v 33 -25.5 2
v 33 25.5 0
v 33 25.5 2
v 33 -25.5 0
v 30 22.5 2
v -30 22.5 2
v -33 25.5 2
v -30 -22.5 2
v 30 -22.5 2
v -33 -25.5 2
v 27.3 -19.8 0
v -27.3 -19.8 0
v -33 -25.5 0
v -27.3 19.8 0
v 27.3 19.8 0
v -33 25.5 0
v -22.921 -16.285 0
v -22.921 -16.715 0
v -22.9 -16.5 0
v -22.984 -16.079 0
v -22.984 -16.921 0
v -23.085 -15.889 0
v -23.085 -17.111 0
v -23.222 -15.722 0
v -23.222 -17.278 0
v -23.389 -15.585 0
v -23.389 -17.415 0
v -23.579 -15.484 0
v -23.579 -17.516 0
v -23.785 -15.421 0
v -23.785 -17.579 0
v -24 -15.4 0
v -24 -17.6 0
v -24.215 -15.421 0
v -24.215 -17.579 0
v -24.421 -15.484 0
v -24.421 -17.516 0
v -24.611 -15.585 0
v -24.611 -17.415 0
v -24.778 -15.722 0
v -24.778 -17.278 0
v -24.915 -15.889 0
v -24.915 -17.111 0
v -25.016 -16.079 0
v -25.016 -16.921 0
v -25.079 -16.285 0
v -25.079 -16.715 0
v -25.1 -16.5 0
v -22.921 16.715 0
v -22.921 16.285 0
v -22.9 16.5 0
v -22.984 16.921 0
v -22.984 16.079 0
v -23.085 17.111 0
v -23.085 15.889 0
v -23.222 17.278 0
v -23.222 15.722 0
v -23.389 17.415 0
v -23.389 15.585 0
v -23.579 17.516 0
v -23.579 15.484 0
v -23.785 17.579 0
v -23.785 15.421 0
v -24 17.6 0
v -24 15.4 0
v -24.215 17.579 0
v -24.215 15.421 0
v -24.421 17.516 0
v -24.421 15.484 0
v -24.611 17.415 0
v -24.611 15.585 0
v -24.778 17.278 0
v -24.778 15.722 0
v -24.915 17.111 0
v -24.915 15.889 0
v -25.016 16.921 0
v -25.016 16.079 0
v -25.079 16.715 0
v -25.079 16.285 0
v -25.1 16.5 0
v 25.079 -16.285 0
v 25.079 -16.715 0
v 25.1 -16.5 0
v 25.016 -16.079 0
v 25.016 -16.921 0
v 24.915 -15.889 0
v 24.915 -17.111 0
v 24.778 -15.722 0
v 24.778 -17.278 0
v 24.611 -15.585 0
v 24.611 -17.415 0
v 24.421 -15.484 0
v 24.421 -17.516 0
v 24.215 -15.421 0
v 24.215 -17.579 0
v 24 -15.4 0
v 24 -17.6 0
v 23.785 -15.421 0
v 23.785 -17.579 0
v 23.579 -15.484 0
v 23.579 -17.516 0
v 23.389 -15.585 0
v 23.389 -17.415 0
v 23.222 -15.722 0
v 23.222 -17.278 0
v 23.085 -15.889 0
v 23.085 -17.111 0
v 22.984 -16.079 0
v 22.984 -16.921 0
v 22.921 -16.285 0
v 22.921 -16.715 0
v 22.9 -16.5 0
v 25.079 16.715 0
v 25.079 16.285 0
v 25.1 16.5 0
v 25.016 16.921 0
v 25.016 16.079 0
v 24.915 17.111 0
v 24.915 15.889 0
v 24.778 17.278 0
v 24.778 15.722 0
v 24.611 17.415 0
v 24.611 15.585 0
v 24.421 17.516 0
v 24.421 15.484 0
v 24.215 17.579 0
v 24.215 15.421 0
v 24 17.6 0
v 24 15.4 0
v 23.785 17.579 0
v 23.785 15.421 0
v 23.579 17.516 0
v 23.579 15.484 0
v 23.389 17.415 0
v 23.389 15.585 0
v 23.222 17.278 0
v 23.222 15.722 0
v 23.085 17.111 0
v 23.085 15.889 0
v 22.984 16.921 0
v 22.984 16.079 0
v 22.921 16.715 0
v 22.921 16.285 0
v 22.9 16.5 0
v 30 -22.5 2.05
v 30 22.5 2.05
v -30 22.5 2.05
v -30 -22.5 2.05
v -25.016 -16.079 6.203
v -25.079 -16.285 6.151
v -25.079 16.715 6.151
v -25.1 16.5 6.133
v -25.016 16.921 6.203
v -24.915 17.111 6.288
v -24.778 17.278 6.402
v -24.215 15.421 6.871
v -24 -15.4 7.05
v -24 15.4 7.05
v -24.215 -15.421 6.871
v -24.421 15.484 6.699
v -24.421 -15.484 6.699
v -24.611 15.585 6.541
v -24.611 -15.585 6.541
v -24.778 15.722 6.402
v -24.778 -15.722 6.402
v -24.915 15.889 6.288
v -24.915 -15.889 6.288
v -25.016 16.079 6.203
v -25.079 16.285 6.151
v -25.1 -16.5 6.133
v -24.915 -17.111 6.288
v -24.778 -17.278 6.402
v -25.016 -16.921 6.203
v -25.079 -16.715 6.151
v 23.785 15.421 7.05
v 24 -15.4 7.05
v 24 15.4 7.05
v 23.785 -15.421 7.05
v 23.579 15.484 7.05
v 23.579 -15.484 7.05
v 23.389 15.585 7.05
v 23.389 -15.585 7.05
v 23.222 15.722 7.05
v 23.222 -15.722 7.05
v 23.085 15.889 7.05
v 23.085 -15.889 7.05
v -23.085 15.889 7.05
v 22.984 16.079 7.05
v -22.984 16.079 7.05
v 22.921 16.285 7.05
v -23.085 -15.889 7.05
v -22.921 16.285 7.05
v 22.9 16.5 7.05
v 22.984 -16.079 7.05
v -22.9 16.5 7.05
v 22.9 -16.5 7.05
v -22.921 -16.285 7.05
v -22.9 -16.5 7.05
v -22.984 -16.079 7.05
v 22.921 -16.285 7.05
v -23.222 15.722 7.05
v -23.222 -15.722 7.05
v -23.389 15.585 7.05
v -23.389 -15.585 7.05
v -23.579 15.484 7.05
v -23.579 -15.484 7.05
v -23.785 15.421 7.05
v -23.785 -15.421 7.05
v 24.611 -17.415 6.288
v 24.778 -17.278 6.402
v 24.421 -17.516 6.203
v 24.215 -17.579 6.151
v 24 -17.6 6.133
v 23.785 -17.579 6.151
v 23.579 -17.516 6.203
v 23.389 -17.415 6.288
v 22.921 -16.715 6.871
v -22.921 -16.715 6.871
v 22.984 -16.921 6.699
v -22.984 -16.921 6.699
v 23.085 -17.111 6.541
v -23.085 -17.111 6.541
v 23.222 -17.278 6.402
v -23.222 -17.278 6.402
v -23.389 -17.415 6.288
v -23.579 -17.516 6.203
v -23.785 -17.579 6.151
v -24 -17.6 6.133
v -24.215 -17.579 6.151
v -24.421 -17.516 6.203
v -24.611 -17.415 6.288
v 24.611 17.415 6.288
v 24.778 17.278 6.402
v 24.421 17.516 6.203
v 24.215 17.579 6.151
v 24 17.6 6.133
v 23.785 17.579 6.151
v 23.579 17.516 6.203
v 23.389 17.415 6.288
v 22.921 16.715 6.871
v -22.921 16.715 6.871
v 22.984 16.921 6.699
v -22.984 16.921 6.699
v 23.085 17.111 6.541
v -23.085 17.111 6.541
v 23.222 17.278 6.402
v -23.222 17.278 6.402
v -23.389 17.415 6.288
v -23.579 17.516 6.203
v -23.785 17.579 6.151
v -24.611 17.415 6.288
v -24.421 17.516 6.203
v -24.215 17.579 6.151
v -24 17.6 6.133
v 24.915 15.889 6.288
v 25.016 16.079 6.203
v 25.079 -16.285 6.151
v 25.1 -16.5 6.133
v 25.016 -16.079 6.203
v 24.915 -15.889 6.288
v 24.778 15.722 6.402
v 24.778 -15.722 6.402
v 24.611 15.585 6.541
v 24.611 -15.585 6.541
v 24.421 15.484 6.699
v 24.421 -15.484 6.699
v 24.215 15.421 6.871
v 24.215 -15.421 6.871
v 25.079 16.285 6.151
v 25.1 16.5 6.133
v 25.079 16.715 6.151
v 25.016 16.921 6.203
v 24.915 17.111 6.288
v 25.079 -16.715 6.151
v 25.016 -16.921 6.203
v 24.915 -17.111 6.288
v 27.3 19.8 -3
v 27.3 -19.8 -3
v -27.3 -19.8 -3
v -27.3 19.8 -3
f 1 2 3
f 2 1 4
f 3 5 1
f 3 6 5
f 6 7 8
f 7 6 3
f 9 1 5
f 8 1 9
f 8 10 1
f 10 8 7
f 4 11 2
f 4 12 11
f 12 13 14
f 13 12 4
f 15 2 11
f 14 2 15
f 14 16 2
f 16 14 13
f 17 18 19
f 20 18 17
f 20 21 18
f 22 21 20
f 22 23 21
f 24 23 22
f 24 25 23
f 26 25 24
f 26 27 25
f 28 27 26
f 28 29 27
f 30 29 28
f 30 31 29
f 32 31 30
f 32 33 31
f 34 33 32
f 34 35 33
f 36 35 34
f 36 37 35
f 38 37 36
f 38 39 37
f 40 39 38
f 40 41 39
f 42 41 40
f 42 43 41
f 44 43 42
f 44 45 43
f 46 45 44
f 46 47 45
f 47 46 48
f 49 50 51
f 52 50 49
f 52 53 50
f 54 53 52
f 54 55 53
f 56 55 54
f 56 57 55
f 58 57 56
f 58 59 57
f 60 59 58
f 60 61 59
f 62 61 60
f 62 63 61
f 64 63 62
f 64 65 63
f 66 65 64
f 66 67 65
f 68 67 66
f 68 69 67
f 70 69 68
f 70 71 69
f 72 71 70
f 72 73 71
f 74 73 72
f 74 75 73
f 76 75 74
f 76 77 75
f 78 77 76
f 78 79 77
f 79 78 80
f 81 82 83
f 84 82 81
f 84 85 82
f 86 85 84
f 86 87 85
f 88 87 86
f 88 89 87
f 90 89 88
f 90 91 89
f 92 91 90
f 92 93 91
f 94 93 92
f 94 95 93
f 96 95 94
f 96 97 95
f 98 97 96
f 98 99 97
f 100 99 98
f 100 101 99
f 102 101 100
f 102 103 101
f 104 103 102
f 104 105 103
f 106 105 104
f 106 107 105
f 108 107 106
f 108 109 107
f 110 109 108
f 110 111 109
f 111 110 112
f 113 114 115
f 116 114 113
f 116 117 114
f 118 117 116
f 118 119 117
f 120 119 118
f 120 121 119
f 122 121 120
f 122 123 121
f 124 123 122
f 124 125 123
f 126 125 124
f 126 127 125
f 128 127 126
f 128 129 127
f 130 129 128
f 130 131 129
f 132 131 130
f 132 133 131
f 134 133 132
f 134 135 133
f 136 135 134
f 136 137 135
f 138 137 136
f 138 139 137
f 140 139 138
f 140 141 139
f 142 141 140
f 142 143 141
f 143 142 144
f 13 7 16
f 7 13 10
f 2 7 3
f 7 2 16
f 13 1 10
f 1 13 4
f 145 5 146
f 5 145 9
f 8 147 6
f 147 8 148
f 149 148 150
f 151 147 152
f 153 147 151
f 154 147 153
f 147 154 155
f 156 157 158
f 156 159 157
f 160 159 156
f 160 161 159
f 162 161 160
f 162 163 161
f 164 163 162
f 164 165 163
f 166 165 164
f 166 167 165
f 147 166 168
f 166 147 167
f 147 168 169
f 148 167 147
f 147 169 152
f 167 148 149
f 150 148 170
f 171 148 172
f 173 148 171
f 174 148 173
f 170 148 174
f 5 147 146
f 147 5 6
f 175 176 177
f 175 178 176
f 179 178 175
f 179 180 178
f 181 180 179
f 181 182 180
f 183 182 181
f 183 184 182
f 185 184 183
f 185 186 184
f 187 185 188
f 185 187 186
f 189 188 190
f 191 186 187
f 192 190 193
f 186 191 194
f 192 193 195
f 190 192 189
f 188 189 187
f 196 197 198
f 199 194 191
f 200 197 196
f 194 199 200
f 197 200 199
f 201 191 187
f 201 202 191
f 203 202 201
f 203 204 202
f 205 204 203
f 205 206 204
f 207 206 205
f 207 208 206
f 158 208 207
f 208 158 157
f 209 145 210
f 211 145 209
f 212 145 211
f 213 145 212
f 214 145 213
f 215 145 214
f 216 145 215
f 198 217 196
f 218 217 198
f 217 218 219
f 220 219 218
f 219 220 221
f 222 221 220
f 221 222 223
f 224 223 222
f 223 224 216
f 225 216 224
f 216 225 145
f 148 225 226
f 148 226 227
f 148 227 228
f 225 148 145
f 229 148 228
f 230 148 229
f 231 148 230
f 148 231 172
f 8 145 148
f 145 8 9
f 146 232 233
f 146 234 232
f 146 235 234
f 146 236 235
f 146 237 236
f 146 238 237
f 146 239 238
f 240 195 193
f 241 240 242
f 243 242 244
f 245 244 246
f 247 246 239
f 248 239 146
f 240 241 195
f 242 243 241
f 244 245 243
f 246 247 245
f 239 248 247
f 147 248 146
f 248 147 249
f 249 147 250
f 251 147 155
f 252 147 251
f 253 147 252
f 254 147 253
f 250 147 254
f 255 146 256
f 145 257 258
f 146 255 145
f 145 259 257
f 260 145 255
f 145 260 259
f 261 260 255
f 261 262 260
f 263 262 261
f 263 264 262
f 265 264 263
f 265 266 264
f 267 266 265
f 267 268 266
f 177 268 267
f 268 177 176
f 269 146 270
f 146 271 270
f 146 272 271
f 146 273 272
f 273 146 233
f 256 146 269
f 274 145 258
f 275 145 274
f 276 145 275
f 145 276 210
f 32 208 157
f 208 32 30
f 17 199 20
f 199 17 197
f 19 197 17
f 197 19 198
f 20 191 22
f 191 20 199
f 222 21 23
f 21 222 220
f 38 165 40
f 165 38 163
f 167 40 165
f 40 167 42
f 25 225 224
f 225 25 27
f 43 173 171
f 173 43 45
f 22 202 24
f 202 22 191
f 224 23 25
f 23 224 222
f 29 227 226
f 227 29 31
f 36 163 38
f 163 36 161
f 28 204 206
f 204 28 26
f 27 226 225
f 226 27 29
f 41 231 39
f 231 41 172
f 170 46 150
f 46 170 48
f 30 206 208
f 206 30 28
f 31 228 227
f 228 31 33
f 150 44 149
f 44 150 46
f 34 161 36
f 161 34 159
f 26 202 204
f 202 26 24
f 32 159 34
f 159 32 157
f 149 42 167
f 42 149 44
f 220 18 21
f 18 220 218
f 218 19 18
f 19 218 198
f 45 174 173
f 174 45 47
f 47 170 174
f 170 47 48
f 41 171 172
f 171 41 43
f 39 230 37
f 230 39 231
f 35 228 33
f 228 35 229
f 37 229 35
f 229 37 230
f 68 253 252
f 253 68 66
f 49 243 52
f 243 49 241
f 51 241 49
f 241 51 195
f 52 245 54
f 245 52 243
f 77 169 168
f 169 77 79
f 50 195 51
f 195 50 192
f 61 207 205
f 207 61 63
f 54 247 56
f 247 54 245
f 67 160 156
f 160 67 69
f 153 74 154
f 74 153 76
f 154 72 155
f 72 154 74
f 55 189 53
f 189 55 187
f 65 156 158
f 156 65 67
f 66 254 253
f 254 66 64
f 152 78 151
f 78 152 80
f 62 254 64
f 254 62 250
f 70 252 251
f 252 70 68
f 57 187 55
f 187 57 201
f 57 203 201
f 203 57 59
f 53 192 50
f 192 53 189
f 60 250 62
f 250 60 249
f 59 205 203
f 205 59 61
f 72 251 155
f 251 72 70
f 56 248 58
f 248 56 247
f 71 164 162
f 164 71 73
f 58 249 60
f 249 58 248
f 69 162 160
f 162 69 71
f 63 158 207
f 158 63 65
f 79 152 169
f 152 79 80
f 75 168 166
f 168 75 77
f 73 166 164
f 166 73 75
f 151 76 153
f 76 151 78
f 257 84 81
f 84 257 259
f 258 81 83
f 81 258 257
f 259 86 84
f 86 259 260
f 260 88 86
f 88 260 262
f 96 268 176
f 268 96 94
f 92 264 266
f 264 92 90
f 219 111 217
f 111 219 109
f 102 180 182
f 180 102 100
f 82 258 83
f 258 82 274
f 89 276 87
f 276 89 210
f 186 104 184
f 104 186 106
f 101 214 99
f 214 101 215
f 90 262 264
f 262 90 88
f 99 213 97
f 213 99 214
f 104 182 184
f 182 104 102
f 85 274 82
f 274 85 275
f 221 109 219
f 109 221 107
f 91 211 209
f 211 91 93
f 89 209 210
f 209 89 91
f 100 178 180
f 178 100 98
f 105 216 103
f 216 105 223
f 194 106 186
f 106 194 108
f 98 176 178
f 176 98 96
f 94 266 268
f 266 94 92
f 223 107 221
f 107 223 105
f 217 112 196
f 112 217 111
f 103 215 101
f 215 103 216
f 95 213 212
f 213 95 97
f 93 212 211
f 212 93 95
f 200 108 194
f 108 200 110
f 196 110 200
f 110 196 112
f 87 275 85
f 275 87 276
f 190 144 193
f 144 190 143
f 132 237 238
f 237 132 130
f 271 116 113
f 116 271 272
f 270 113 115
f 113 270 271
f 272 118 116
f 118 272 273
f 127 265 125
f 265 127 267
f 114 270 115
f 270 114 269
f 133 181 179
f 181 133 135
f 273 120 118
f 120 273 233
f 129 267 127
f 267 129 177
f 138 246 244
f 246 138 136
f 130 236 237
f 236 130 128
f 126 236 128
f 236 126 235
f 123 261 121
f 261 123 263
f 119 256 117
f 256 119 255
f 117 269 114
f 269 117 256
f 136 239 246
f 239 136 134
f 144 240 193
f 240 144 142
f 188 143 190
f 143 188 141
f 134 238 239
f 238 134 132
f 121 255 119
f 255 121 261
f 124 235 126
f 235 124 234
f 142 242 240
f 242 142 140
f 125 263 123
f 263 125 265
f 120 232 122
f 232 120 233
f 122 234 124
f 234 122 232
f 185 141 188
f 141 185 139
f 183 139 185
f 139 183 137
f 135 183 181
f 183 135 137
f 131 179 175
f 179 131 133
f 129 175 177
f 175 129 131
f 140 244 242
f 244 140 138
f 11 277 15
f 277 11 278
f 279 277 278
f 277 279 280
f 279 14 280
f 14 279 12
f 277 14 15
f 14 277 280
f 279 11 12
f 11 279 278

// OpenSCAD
//////////////////////////////////////////////////////////////
// LD2410B Presence Node — LID v0.2
// Standalone file — print this separately from the body.
// "Hat" geometry: overhanging brim (rain drip edge) + tapered
// cap on top + a plug underneath that registers into the
// body's top opening.
//
// Dimensions below MUST match presence_node_v0.4.scad.
//////////////////////////////////////////////////////////////

// --- Match these to the body file ---
body_width    = 60;
body_depth    = 45;
wall          = 2.4;
screw_hole_d  = 1.6;
clearance     = 0.6;

// --- Lid-specific ---
brim_overhang = 3;    // how far the lid extends past the body on each side
brim_h        = 2;    // thickness of the overhanging brim
dome_h        = 5;    // height of the tapered cap above the brim
dome_inset    = 6;     // how much narrower the cap top is than the body, each side
step_h        = 3;    // depth of the plug that drops into the body opening
step_gap      = 0.6;  // total clearance so the plug slides in without jamming

module lid() {
    union() {
        difference() {
            union() {
                // --- Brim: wider than the body, this is the drip edge ---
                translate([0, 0, brim_h/2])
                    cube([body_width + 2*brim_overhang,
                          body_depth + 2*brim_overhang,
                          brim_h], center = true);

                // --- Cap: tapers up from the body footprint to a smaller top ---
                translate([0, 0, brim_h])
                    hull() {
                        cube([body_width, body_depth, 0.1], center = true);
                        translate([0, 0, dome_h])
                            cube([body_width - 2*dome_inset,
                                  body_depth - 2*dome_inset,
                                  0.1], center = true);
                    }
            }
            // --- Corner screw holes, full height, aligned to the body's bosses ---
            for (x = [-1, 1])
                for (y = [-1, 1])
                    translate([x * (body_width/2 - 6),
                               y * (body_depth/2 - 6),
                               (brim_h + dome_h)/2])
                        cylinder(h = brim_h + dome_h + 4,
                                 d = screw_hole_d + clearance,
                                 $fn = 32, center = true);
        }

        // --- Plug: drops down into the body's top opening for registration ---
        translate([0, 0, -step_h/2])
            cube([body_width - 2*wall - step_gap,
                  body_depth - 2*wall - step_gap,
                  step_h], center = true);
    }
}

// Render — without this line, nothing prints.
lid();
